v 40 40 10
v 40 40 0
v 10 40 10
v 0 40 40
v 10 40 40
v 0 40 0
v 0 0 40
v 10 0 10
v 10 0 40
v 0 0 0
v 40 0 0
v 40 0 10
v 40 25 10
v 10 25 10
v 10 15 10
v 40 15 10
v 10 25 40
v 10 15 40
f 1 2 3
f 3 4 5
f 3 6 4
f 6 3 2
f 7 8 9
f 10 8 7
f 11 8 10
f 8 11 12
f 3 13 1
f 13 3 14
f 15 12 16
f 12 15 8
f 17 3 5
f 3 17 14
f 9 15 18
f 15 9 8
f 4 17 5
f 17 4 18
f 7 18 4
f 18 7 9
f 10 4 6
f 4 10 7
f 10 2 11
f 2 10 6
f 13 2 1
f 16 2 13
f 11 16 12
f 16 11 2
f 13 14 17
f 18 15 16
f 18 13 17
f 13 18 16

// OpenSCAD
// Isometric_2.scad
// Produces 3 different views
// Square, Square, Triangle from 3 sides

translate ([0,40,0])
rotate([90, 0, 0])
linear_extrude(40)
    polygon(points=[[0,0],[40,0],[40,10],[10,10],
    [10,40],[0,40]]);
    
translate ([0,25,0])
rotate([90, 0, 0])   
linear_extrude(10)   
polygon(points=[[10,10],[40,10],[10,40]]);
